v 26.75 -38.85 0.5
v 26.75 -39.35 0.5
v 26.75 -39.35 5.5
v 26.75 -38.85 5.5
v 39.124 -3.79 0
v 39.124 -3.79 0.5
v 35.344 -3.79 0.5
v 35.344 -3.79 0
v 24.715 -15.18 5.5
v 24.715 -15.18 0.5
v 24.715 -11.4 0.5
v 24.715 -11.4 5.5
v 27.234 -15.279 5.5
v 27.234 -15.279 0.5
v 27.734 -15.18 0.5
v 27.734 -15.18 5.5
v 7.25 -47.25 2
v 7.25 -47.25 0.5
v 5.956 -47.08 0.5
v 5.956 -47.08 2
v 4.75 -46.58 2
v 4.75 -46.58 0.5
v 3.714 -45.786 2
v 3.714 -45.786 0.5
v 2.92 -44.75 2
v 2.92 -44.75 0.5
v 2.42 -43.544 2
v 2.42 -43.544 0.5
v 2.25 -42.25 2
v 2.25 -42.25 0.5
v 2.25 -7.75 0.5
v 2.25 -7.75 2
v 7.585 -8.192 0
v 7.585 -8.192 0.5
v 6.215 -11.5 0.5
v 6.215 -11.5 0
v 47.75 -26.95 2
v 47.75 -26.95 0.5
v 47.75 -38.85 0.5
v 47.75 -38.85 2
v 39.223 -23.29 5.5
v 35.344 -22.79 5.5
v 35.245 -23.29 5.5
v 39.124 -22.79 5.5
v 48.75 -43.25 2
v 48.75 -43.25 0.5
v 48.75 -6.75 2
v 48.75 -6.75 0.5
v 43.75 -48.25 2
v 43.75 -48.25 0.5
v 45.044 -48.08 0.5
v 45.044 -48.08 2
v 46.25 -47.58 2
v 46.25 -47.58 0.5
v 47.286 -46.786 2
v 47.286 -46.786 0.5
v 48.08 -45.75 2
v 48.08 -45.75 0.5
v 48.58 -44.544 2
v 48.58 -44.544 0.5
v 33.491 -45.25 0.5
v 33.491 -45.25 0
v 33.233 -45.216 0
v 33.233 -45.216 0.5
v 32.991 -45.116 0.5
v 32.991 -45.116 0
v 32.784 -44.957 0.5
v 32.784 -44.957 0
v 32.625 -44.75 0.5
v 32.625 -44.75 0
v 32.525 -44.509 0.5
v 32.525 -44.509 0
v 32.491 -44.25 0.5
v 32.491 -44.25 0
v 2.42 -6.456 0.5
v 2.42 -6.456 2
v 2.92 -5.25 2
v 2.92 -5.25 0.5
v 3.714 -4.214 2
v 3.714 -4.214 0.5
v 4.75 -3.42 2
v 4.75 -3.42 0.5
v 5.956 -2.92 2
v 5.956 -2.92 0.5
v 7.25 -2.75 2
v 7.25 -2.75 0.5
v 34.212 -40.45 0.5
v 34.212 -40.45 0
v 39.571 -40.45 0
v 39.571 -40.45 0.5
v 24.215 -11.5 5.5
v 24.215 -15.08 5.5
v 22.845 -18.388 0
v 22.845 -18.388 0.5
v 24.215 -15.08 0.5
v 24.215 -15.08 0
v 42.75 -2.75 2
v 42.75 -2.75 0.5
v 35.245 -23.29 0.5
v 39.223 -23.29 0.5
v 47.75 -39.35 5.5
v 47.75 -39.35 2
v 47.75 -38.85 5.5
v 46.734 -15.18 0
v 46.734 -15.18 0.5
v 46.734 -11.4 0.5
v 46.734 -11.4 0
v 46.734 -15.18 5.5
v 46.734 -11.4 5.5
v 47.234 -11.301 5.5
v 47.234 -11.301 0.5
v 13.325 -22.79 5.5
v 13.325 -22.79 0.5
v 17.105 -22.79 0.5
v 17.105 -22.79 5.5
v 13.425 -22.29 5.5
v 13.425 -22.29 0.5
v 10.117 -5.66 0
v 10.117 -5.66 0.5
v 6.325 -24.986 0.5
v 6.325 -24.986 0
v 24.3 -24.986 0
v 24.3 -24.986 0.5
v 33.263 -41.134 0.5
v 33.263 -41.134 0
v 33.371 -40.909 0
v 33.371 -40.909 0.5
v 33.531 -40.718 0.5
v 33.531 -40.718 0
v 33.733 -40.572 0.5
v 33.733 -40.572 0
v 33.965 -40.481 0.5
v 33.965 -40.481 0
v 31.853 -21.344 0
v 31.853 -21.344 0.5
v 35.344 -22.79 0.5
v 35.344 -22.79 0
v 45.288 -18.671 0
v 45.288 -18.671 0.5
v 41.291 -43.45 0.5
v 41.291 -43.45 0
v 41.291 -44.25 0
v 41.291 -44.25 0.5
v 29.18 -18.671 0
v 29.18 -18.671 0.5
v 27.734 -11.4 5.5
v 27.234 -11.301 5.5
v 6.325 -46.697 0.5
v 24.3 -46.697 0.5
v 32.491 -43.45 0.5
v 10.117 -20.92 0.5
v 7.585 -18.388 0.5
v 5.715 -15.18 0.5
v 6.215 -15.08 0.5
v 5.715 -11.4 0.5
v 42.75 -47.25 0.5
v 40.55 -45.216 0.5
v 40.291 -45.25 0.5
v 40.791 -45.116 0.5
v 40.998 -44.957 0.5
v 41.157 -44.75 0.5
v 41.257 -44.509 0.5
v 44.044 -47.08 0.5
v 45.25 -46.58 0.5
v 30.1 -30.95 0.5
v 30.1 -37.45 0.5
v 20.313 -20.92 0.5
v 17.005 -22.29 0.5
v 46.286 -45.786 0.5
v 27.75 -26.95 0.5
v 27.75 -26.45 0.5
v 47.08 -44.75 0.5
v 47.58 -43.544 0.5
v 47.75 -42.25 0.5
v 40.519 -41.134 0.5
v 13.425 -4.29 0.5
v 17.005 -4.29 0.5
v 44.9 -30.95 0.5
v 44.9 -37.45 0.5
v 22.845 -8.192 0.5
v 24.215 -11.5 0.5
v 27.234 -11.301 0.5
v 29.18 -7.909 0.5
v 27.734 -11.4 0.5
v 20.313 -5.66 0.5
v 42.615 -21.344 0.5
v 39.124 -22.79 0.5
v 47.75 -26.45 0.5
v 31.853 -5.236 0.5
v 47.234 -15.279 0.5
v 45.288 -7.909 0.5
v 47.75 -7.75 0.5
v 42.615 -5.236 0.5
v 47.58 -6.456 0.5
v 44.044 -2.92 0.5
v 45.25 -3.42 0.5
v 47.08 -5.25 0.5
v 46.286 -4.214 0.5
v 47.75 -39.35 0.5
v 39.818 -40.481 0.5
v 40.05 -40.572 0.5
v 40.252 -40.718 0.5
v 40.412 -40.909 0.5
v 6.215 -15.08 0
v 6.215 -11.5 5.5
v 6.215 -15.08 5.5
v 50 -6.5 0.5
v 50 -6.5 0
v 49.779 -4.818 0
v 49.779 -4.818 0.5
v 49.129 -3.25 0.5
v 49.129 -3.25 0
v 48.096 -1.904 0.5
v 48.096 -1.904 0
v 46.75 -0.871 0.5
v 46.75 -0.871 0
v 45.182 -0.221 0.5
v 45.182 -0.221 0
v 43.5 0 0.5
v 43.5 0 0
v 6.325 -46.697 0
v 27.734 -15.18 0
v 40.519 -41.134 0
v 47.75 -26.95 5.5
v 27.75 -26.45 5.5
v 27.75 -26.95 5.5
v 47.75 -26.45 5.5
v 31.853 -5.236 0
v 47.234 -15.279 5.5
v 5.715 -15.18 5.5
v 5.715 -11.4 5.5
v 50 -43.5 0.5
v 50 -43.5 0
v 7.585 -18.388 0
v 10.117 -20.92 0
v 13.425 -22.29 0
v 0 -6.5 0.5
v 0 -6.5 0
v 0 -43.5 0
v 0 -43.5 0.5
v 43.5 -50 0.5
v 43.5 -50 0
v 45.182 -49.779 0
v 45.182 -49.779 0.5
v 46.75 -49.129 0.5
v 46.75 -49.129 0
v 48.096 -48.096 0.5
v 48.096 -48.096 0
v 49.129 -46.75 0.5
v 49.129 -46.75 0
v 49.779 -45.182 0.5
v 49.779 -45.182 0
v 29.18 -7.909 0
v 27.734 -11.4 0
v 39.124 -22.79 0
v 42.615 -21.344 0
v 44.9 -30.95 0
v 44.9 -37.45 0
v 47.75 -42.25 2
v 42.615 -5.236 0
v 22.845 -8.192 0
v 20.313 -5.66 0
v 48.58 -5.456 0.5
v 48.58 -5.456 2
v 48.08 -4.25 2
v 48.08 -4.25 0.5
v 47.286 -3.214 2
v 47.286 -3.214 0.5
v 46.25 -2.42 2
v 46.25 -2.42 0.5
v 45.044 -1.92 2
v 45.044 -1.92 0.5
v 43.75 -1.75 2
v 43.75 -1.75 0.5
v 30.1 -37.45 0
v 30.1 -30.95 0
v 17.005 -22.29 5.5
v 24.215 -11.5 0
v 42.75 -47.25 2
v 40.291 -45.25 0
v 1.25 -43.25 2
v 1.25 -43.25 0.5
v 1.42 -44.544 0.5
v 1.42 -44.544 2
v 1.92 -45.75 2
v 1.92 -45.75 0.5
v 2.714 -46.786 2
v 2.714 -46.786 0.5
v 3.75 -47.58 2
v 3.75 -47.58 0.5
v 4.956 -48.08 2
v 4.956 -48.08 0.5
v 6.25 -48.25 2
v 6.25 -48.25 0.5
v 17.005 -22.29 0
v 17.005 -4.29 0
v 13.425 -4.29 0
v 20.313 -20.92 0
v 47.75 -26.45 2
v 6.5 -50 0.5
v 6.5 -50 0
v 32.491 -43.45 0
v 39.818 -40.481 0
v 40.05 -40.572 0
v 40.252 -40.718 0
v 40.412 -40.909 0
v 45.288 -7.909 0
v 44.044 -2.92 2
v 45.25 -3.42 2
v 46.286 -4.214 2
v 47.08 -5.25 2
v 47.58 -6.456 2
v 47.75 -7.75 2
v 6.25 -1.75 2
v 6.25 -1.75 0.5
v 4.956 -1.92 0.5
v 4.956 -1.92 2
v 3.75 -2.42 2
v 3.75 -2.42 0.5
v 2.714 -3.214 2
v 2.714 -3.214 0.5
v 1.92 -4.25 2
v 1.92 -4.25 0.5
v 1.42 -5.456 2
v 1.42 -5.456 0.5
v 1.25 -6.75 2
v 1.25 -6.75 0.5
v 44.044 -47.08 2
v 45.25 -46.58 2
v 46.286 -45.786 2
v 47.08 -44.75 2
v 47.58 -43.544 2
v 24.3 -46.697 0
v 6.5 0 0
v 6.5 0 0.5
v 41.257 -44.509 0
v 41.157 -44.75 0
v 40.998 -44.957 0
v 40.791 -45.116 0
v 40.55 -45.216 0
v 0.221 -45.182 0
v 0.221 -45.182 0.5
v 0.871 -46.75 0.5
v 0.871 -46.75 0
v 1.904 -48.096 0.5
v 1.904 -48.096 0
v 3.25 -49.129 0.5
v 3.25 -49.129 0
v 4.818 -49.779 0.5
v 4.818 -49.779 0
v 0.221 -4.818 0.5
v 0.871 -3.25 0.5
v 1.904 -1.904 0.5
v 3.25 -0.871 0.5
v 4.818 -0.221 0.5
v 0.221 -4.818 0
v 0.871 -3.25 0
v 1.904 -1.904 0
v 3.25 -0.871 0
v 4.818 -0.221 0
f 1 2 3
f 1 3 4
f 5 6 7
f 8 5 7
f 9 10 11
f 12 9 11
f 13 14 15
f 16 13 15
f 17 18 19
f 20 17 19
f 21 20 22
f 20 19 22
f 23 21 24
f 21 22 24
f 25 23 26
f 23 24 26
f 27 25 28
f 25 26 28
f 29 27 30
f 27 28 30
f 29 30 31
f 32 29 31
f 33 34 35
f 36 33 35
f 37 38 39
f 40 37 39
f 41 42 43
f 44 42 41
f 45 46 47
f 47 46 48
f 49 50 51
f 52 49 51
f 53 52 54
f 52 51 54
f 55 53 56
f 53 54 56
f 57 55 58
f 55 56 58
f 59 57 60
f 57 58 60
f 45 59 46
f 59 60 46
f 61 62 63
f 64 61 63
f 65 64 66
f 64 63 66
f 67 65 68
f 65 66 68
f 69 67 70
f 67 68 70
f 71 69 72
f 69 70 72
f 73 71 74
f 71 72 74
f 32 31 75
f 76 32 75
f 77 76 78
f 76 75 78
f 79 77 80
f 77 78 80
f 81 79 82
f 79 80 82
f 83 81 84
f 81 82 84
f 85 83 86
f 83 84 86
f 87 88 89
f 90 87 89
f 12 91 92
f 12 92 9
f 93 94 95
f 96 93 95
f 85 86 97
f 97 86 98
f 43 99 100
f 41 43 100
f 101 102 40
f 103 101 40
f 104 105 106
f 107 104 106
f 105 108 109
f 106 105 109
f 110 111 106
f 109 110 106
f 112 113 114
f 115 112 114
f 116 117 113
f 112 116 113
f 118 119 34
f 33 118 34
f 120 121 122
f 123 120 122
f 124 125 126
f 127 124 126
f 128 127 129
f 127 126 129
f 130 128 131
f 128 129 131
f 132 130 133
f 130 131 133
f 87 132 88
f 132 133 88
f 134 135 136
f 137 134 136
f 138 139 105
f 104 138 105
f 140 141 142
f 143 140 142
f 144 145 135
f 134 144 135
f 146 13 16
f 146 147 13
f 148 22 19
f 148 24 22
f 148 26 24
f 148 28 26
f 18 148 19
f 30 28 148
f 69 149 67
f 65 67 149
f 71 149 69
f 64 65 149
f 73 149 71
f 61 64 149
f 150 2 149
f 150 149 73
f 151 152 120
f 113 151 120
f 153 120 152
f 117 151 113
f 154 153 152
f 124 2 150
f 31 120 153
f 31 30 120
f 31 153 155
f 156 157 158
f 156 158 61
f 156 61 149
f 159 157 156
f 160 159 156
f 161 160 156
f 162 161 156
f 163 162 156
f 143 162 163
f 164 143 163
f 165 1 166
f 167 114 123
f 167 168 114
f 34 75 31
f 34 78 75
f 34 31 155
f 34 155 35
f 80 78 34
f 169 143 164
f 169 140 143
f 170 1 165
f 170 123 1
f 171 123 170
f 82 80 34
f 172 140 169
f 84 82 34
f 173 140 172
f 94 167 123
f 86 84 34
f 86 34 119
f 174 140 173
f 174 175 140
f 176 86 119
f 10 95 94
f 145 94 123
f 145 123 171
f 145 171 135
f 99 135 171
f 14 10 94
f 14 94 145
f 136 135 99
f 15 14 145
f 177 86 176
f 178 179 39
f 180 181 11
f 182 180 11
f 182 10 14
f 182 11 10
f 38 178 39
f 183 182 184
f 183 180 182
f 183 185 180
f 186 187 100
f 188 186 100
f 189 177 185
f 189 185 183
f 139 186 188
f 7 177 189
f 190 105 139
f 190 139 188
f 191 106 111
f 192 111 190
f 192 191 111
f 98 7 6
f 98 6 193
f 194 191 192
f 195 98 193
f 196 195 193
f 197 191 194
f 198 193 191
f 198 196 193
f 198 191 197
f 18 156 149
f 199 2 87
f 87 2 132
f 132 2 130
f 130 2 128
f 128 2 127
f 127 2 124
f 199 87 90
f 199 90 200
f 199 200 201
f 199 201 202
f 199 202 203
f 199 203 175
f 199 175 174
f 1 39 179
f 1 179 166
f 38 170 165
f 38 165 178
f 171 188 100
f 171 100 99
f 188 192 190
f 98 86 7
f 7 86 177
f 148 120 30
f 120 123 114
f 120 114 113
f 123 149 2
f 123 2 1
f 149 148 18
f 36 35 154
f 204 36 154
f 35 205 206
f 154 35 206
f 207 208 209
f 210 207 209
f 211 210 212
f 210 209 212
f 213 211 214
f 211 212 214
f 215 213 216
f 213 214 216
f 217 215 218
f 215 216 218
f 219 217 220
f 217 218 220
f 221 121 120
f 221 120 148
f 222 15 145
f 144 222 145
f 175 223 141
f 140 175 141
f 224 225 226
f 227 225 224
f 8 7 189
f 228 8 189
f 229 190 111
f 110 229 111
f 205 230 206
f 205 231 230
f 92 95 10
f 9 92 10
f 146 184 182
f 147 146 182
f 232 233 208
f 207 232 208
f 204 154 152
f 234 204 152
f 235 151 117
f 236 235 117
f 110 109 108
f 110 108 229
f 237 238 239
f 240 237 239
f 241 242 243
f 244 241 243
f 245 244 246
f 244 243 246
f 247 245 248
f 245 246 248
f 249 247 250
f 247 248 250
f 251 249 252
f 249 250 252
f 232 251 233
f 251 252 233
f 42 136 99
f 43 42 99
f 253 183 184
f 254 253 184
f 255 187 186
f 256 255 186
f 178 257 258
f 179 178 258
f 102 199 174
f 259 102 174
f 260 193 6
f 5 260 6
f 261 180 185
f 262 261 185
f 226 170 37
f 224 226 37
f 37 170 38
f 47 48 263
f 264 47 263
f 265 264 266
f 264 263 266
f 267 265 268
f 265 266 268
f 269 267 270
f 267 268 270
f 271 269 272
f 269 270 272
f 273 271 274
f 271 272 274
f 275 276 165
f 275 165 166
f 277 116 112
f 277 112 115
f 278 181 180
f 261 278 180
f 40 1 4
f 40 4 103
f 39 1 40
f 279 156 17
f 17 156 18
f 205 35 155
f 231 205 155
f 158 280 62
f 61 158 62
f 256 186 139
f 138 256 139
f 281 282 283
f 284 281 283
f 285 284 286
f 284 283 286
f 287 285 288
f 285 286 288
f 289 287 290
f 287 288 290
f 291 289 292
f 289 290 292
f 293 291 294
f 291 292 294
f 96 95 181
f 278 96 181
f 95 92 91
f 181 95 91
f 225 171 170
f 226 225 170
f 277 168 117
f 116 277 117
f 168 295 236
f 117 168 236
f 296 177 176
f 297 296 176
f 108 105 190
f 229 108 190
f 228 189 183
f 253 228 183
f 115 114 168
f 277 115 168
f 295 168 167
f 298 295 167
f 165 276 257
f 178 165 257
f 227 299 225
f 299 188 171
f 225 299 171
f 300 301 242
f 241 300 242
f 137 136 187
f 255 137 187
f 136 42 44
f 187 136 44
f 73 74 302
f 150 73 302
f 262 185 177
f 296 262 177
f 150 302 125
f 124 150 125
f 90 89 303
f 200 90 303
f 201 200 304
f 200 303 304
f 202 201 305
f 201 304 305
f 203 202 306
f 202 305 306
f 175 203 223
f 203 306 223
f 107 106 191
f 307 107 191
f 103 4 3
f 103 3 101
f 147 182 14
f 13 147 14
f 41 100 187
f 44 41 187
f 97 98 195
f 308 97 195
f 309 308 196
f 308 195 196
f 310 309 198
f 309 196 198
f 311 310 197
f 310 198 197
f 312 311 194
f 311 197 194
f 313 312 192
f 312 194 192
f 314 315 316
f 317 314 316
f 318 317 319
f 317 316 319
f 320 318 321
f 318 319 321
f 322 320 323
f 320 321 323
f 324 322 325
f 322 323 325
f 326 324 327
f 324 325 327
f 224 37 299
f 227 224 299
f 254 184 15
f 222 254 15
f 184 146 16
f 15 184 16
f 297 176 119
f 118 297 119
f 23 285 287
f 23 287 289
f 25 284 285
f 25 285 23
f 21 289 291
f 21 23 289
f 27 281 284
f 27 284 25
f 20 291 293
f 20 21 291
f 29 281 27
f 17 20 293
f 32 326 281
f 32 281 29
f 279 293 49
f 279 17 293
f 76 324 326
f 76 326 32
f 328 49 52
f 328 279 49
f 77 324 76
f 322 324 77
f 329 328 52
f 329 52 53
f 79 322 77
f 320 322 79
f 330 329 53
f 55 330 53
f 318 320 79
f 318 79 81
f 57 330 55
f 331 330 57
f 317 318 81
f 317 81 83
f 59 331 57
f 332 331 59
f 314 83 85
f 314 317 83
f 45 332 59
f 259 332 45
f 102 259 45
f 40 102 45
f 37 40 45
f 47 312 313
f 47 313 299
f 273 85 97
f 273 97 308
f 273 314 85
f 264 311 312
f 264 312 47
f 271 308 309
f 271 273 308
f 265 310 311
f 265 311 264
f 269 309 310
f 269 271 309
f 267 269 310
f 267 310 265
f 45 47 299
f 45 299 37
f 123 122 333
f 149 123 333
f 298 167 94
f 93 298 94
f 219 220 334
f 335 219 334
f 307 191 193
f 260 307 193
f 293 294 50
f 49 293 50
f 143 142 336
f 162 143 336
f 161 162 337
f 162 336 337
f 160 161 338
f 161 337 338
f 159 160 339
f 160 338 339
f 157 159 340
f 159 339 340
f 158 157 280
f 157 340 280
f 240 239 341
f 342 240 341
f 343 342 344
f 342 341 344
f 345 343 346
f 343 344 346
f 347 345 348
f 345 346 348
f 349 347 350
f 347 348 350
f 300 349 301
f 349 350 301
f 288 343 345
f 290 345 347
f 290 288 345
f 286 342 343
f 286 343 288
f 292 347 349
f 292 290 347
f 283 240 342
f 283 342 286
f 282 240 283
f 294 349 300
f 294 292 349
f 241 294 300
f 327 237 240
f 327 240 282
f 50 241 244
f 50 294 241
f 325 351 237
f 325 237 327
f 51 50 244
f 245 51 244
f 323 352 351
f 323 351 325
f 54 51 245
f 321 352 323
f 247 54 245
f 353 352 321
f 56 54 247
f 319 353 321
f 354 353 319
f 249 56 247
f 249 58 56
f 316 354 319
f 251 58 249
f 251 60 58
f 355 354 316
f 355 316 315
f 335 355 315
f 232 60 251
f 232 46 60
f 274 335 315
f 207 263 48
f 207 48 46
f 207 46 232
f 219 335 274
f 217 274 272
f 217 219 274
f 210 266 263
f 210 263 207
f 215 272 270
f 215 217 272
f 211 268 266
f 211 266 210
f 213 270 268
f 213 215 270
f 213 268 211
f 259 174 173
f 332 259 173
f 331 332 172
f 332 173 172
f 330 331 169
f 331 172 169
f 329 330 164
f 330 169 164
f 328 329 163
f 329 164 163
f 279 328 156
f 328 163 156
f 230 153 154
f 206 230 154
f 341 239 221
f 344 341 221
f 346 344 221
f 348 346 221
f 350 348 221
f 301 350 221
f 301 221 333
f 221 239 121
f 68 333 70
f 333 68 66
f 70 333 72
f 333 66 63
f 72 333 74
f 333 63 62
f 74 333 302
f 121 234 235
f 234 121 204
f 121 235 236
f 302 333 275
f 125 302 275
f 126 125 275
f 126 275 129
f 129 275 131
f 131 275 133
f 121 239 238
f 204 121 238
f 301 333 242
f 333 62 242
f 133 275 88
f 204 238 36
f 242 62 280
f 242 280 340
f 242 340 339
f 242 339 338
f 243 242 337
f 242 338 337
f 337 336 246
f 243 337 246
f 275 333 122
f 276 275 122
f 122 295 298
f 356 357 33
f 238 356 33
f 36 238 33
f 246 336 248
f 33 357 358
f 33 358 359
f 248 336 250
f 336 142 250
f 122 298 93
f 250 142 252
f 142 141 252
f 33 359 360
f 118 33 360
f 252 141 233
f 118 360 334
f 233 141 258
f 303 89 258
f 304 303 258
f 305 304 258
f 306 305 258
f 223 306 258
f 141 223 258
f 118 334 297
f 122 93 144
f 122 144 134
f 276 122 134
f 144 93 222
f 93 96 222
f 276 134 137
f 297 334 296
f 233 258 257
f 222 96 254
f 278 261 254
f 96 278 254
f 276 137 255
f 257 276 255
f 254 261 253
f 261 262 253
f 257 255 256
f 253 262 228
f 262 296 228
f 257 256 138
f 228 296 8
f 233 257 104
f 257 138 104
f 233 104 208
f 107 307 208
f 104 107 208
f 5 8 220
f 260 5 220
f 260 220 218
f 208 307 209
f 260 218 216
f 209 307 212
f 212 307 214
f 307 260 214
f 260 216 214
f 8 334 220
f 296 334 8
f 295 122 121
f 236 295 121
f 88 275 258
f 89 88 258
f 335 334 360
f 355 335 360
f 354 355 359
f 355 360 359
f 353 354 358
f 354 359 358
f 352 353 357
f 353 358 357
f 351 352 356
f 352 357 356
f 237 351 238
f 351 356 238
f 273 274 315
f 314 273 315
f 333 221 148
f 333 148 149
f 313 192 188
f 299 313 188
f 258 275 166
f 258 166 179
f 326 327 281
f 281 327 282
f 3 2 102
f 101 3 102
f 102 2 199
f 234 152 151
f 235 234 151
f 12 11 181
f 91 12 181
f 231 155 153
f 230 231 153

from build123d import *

# Parameters (mm, degrees)
F1_DEPTH  = 0.5
F4_DEPTH  = 1.5
F5_W      = 17.9758077912
F5_H      = 21.7117034923
F5_W_2    = 14.8
F5_H_2    = 6.5
F6_DEPTH  = 0.5
F7_W      = 21
F7_H      = 0.5
F8_DEPTH  = 5
F10_DEPTH = 5
F11_DEPTH = 0.5
F12_DEPTH = 0.5


# Not quite as in the source:
# - a feature names something its author has since deleted; it is built from what else it names


with BuildPart() as f1:
    # F0 (on Top) → F1 (new body)
    with BuildSketch(Plane.XY):
        with BuildLine():
            Line((43.5, 0), (6.5, 0))
            ThreePointArc((6.5, 0), (1.9038059223, -1.9038059223), (0, -6.5))
            Line((0, -6.5), (0, -43.5))
            ThreePointArc((0, -43.5), (1.9038059223, -48.0961940777), (6.5, -50))
            Line((6.5, -50), (43.5, -50))
            ThreePointArc((43.5, -50), (48.0961940777, -48.0961940777), (50, -43.5))
            Line((50, -43.5), (50, -6.5))
            ThreePointArc((50, -6.5), (48.0961940777, -1.9038059223), (43.5, 0))
        make_face()
    extrude(amount=F1_DEPTH)

    # F2 (on face) → F4 (join)
    with BuildSketch(Plane.XY.offset(0.5)):
        with BuildLine():
            Line((43.75, -1.75), (6.25, -1.75))
            ThreePointArc((6.25, -1.75), (2.7144660941, -3.2144660941), (1.25, -6.75))
            Line((1.25, -6.75), (1.25, -43.25))
            ThreePointArc((1.25, -43.25), (2.7144660941, -46.7855339059), (6.25, -48.25))
            Line((6.25, -48.25), (43.75, -48.25))
            ThreePointArc((43.75, -48.25), (47.2855339059, -46.7855339059), (48.75, -43.25))
            Line((48.75, -43.25), (48.75, -6.75))
            ThreePointArc((48.75, -6.75), (47.2855339059, -3.2144660941), (43.75, -1.75))
        make_face()
        with BuildLine():
            ThreePointArc((2.25, -7.75), (3.7144660941, -4.2144660941), (7.25, -2.75))
            Line((7.25, -2.75), (42.75, -2.75))
            ThreePointArc((42.75, -2.75), (46.2855339059, -4.2144660941), (47.75, -7.75))
            Line((47.75, -7.75), (47.75, -42.25))
            ThreePointArc((47.75, -42.25), (46.2855339059, -45.7855339059), (42.75, -47.25))
            Line((42.75, -47.25), (7.25, -47.25))
            ThreePointArc((7.25, -47.25), (3.7144660941, -45.7855339059), (2.25, -42.25))
            Line((2.25, -42.25), (2.25, -7.75))
        make_face(mode=Mode.SUBTRACT)
    extrude(amount=F4_DEPTH)

    # F5 (on face) → F6 (cut, through all)
    with BuildSketch(Plane(origin=(0, 0, 0), x_dir=(1, 0, 0), z_dir=(0, 0, -1))):
        with Locations((15.3125571672, 35.8414453501)):
            Rectangle(F5_W, F5_H)
        with BuildLine():
            Line((40.2913850072, 45.25), (33.4913850072, 45.25))
            ThreePointArc((33.4913850072, 45.25), (32.784278226, 44.9571067812), (32.4913850072, 44.25))
            Line((32.4913850072, 44.25), (32.4913850072, 43.45))
            Line((32.4913850072, 43.45), (33.2634609292, 41.133772234))
            ThreePointArc((33.2634609292, 41.133772234), (33.6274339426, 40.6387578148), (34.2121442272, 40.45))
            Line((34.2121442272, 40.45), (39.5706257871, 40.45))
            ThreePointArc((39.5706257871, 40.45), (40.1553360718, 40.6387578148), (40.5193090852, 41.133772234))
            Line((40.5193090852, 41.133772234), (41.2913850072, 43.45))
            Line((41.2913850072, 43.45), (41.2913850072, 44.25))
            ThreePointArc((41.2913850072, 44.25), (40.9984917884, 44.9571067812), (40.2913850072, 45.25))
        make_face()
        with Locations((37.5, 34.2)):
            Rectangle(F5_W_2, F5_H_2)
    extrude(amount=-F6_DEPTH, mode=Mode.SUBTRACT)

    # F7 (on face) → F8 (join)
    with BuildSketch(Plane.XY.offset(0.5)):
        with Locations((37.25, -39.1)):
            Rectangle(F7_W, F7_H)
        Polygon((37.75, -26.95), (47.75, -26.95), (47.75, -26.45), (27.75, -26.45), (27.75, -26.95), align=None)
    extrude(amount=F8_DEPTH)

    # F9 (on face) → F10 (join)
    with BuildSketch(Plane.XY.offset(0.5)):
        Polygon((46.7340297326, -11.4003978506), (46.7340297326, -15.1797328308), (47.2340297326, -15.2791890145), (47.2340297326, -11.3009416669), align=None)
        Polygon((39.1236972228, -22.7900653407), (35.3443622425, -22.7900653407), (35.2449060588, -23.2900653407), (39.2231534064, -23.2900653407), align=None)
        Polygon((27.2340297326, -15.2791890145), (27.7340297326, -15.1797328308), (27.7340297326, -11.4003978506), (27.2340297326, -11.3009416669), align=None)
        Polygon((17.1048343345, -22.7900653407), (17.0053781508, -22.2900653407), (13.424955538, -22.2900653407), (13.3254993543, -22.7900653407), align=None)
        Polygon((24.2151668444, -11.4998540343), (24.2151668444, -15.0802766471), (24.7151668444, -15.1797328308), (24.7151668444, -11.4003978506), align=None)
        Polygon((5.7151668444, -15.1797328308), (6.2151668444, -15.0802766471), (6.2151668444, -11.4998540343), (5.7151668444, -11.4003978506), align=None)
    extrude(amount=F10_DEPTH)

    # F9 (on face) → F11 (cut, through all)
    with BuildSketch(Plane.XY.offset(0.5)):
        Polygon((27.7340297326, -15.1797328308), (29.1803186149, -18.6713830655), (31.8527120078, -21.3437764584), (35.3443622425, -22.7900653407), (39.1236972228, -22.7900653407), (42.6153474575, -21.3437764584), (45.2877408504, -18.6713830655), (46.7340297326, -15.1797328308), (46.7340297326, -11.4003978506), (45.2877408504, -7.9087476159), (42.6153474575, -5.236354223), (39.1236972228, -3.7900653407), (35.3443622425, -3.7900653407), (31.8527120078, -5.236354223), (29.1803186149, -7.9087476159), (27.7340297326, -11.4003978506), align=None)
    extrude(amount=-F11_DEPTH, mode=Mode.SUBTRACT)

    # F9 (on face) → F12 (cut, through all)
    with BuildSketch(Plane.XY.offset(0.5)):
        Polygon((22.8449984296, -18.3881558169), (24.2151668444, -15.0802766471), (24.2151668444, -11.4998540343), (22.8449984296, -8.1919748645), (20.3132573206, -5.6602337555), (17.0053781508, -4.2900653407), (13.424955538, -4.2900653407), (10.1170763683, -5.6602337555), (7.5853352592, -8.1919748645), (6.2151668444, -11.4998540343), (6.2151668444, -15.0802766471), (7.5853352592, -18.3881558169), (10.1170763683, -20.9198969259), (13.424955538, -22.2900653407), (17.0053781508, -22.2900653407), (20.3132573206, -20.9198969259), align=None)
    extrude(amount=-F12_DEPTH, mode=Mode.SUBTRACT)


solid = f1.part
